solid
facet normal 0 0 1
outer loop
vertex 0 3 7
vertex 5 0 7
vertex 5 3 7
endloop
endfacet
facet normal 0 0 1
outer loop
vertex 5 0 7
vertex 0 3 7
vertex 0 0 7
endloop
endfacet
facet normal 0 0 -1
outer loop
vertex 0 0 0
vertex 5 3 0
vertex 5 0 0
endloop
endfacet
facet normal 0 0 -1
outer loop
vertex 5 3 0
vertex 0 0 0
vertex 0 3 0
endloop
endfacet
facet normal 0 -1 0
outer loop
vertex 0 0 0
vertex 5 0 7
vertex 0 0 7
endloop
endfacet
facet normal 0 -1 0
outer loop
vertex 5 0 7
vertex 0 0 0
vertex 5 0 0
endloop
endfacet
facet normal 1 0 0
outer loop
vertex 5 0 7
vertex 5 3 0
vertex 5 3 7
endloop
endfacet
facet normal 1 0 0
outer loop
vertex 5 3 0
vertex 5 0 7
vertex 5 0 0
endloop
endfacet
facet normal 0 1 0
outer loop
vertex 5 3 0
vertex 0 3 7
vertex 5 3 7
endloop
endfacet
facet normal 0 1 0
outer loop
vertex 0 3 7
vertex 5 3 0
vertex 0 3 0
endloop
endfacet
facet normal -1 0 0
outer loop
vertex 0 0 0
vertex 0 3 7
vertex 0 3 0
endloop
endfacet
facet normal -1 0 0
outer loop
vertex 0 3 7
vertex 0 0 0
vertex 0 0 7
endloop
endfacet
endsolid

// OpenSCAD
// Generated by SolidPython 1.0.1 on 2020-07-29 00:46:54


cube(size = [5, 3, 7]);
/***********************************************
*********      SolidPython code:      **********
************************************************
 
# import packages: SolidPython
from solid import *
from solid.utils import *
from itertools import chain, combinations, permutations


class Resize:

    def __init__(self, scad_file):
        self.scad_file = scad_file
        #self.scad_file = import_scad(scad_file)
        # cone/cylinder param:
        self.r1 = 0
        self.r2 = 0
        self.h = 0
        # rectangular prism param:
        self.w = 0
        self.l = 0
        # ellipse param:
        self.r = 0

    # import OpenScad code (file name corresponds to shape)


    # classify shape + parameters
    def assign(self, param1, param2, param3):
        if self.scad_file == 'cone.scad':
            self.r1 = param1
            self.r2 = param2
            self.h = param3
        elif self.scad_file == 'cylinder.scad':
            self.r1 = param1
            self.r2 = param2
            self.h = param3
        elif self.scad_file == 'rectangularPrism.scad':
            self.h = param1
            self.l = param2
            self.w = param3
        else:
            self.r = param1
            self.h = param2

    # resize parameters
    def iterate(self):
        x = range(3, 20, 2)
        i = 1
        if self.scad_file == 'cone.scad':
            tempList = list(permutations(x, 2))
            for temp in tempList:
                param1 = temp[0]
                param2 = temp[1]
                filepath = 'produced_scad_files/' + 'cone' + str(param1) + '_' + str(param2) + '_' + '.scad'
                scad_render_to_file(cylinder(h=param1, r1=param2, r2=0), filepath)

        elif self.scad_file == 'cylinder.scad':
            tempList = list(permutations(x, 3))
            for temp in tempList:
                param1 = temp[0]
                param2 = temp[1]
                filepath = 'produced_scad_files/' + 'cylinder' + str(param1) + '_' + str(param2) + '_' + '.scad'
                scad_render_to_file(cylinder(h=param1, r1=param2, r2=param2), filepath)

        elif self.scad_file == 'rectangularPrism.scad':
            tempList = list(permutations(x, 3))
            for temp in tempList:
                param1 = temp[0]
                param2 = temp[1]
                param3 = temp[2]
                filepath = 'produced_scad_files/' + 'rectangularPrism' + str(param1) + '_' + str(param2) + '_' + str(
                    param3) + '.scad'
                scad_render_to_file(cube(size=(param1, param2, param3)), filepath)

        elif self.scad_file == 'ellipse.scad':
            tempList = list(permutations(x, 4))
            for temp in tempList:
                param1 = temp[0]
                param2 = temp[1]
                param3 = temp[2]
                param4 = temp[3]
                filepath = 'produced_scad_files/' + 'ellipse' + str(param1) + '_' + str(param2) + '_' + str(param3) + '_' + str(param4) + '.scad'
                scad_render_to_file(scale([param1, param2, param3])(sphere(r=param4)), filepath)

    def render_to_scadfile(self):
        scad_render_to_file(scad, 'example.scad') 
 
************************************************/
